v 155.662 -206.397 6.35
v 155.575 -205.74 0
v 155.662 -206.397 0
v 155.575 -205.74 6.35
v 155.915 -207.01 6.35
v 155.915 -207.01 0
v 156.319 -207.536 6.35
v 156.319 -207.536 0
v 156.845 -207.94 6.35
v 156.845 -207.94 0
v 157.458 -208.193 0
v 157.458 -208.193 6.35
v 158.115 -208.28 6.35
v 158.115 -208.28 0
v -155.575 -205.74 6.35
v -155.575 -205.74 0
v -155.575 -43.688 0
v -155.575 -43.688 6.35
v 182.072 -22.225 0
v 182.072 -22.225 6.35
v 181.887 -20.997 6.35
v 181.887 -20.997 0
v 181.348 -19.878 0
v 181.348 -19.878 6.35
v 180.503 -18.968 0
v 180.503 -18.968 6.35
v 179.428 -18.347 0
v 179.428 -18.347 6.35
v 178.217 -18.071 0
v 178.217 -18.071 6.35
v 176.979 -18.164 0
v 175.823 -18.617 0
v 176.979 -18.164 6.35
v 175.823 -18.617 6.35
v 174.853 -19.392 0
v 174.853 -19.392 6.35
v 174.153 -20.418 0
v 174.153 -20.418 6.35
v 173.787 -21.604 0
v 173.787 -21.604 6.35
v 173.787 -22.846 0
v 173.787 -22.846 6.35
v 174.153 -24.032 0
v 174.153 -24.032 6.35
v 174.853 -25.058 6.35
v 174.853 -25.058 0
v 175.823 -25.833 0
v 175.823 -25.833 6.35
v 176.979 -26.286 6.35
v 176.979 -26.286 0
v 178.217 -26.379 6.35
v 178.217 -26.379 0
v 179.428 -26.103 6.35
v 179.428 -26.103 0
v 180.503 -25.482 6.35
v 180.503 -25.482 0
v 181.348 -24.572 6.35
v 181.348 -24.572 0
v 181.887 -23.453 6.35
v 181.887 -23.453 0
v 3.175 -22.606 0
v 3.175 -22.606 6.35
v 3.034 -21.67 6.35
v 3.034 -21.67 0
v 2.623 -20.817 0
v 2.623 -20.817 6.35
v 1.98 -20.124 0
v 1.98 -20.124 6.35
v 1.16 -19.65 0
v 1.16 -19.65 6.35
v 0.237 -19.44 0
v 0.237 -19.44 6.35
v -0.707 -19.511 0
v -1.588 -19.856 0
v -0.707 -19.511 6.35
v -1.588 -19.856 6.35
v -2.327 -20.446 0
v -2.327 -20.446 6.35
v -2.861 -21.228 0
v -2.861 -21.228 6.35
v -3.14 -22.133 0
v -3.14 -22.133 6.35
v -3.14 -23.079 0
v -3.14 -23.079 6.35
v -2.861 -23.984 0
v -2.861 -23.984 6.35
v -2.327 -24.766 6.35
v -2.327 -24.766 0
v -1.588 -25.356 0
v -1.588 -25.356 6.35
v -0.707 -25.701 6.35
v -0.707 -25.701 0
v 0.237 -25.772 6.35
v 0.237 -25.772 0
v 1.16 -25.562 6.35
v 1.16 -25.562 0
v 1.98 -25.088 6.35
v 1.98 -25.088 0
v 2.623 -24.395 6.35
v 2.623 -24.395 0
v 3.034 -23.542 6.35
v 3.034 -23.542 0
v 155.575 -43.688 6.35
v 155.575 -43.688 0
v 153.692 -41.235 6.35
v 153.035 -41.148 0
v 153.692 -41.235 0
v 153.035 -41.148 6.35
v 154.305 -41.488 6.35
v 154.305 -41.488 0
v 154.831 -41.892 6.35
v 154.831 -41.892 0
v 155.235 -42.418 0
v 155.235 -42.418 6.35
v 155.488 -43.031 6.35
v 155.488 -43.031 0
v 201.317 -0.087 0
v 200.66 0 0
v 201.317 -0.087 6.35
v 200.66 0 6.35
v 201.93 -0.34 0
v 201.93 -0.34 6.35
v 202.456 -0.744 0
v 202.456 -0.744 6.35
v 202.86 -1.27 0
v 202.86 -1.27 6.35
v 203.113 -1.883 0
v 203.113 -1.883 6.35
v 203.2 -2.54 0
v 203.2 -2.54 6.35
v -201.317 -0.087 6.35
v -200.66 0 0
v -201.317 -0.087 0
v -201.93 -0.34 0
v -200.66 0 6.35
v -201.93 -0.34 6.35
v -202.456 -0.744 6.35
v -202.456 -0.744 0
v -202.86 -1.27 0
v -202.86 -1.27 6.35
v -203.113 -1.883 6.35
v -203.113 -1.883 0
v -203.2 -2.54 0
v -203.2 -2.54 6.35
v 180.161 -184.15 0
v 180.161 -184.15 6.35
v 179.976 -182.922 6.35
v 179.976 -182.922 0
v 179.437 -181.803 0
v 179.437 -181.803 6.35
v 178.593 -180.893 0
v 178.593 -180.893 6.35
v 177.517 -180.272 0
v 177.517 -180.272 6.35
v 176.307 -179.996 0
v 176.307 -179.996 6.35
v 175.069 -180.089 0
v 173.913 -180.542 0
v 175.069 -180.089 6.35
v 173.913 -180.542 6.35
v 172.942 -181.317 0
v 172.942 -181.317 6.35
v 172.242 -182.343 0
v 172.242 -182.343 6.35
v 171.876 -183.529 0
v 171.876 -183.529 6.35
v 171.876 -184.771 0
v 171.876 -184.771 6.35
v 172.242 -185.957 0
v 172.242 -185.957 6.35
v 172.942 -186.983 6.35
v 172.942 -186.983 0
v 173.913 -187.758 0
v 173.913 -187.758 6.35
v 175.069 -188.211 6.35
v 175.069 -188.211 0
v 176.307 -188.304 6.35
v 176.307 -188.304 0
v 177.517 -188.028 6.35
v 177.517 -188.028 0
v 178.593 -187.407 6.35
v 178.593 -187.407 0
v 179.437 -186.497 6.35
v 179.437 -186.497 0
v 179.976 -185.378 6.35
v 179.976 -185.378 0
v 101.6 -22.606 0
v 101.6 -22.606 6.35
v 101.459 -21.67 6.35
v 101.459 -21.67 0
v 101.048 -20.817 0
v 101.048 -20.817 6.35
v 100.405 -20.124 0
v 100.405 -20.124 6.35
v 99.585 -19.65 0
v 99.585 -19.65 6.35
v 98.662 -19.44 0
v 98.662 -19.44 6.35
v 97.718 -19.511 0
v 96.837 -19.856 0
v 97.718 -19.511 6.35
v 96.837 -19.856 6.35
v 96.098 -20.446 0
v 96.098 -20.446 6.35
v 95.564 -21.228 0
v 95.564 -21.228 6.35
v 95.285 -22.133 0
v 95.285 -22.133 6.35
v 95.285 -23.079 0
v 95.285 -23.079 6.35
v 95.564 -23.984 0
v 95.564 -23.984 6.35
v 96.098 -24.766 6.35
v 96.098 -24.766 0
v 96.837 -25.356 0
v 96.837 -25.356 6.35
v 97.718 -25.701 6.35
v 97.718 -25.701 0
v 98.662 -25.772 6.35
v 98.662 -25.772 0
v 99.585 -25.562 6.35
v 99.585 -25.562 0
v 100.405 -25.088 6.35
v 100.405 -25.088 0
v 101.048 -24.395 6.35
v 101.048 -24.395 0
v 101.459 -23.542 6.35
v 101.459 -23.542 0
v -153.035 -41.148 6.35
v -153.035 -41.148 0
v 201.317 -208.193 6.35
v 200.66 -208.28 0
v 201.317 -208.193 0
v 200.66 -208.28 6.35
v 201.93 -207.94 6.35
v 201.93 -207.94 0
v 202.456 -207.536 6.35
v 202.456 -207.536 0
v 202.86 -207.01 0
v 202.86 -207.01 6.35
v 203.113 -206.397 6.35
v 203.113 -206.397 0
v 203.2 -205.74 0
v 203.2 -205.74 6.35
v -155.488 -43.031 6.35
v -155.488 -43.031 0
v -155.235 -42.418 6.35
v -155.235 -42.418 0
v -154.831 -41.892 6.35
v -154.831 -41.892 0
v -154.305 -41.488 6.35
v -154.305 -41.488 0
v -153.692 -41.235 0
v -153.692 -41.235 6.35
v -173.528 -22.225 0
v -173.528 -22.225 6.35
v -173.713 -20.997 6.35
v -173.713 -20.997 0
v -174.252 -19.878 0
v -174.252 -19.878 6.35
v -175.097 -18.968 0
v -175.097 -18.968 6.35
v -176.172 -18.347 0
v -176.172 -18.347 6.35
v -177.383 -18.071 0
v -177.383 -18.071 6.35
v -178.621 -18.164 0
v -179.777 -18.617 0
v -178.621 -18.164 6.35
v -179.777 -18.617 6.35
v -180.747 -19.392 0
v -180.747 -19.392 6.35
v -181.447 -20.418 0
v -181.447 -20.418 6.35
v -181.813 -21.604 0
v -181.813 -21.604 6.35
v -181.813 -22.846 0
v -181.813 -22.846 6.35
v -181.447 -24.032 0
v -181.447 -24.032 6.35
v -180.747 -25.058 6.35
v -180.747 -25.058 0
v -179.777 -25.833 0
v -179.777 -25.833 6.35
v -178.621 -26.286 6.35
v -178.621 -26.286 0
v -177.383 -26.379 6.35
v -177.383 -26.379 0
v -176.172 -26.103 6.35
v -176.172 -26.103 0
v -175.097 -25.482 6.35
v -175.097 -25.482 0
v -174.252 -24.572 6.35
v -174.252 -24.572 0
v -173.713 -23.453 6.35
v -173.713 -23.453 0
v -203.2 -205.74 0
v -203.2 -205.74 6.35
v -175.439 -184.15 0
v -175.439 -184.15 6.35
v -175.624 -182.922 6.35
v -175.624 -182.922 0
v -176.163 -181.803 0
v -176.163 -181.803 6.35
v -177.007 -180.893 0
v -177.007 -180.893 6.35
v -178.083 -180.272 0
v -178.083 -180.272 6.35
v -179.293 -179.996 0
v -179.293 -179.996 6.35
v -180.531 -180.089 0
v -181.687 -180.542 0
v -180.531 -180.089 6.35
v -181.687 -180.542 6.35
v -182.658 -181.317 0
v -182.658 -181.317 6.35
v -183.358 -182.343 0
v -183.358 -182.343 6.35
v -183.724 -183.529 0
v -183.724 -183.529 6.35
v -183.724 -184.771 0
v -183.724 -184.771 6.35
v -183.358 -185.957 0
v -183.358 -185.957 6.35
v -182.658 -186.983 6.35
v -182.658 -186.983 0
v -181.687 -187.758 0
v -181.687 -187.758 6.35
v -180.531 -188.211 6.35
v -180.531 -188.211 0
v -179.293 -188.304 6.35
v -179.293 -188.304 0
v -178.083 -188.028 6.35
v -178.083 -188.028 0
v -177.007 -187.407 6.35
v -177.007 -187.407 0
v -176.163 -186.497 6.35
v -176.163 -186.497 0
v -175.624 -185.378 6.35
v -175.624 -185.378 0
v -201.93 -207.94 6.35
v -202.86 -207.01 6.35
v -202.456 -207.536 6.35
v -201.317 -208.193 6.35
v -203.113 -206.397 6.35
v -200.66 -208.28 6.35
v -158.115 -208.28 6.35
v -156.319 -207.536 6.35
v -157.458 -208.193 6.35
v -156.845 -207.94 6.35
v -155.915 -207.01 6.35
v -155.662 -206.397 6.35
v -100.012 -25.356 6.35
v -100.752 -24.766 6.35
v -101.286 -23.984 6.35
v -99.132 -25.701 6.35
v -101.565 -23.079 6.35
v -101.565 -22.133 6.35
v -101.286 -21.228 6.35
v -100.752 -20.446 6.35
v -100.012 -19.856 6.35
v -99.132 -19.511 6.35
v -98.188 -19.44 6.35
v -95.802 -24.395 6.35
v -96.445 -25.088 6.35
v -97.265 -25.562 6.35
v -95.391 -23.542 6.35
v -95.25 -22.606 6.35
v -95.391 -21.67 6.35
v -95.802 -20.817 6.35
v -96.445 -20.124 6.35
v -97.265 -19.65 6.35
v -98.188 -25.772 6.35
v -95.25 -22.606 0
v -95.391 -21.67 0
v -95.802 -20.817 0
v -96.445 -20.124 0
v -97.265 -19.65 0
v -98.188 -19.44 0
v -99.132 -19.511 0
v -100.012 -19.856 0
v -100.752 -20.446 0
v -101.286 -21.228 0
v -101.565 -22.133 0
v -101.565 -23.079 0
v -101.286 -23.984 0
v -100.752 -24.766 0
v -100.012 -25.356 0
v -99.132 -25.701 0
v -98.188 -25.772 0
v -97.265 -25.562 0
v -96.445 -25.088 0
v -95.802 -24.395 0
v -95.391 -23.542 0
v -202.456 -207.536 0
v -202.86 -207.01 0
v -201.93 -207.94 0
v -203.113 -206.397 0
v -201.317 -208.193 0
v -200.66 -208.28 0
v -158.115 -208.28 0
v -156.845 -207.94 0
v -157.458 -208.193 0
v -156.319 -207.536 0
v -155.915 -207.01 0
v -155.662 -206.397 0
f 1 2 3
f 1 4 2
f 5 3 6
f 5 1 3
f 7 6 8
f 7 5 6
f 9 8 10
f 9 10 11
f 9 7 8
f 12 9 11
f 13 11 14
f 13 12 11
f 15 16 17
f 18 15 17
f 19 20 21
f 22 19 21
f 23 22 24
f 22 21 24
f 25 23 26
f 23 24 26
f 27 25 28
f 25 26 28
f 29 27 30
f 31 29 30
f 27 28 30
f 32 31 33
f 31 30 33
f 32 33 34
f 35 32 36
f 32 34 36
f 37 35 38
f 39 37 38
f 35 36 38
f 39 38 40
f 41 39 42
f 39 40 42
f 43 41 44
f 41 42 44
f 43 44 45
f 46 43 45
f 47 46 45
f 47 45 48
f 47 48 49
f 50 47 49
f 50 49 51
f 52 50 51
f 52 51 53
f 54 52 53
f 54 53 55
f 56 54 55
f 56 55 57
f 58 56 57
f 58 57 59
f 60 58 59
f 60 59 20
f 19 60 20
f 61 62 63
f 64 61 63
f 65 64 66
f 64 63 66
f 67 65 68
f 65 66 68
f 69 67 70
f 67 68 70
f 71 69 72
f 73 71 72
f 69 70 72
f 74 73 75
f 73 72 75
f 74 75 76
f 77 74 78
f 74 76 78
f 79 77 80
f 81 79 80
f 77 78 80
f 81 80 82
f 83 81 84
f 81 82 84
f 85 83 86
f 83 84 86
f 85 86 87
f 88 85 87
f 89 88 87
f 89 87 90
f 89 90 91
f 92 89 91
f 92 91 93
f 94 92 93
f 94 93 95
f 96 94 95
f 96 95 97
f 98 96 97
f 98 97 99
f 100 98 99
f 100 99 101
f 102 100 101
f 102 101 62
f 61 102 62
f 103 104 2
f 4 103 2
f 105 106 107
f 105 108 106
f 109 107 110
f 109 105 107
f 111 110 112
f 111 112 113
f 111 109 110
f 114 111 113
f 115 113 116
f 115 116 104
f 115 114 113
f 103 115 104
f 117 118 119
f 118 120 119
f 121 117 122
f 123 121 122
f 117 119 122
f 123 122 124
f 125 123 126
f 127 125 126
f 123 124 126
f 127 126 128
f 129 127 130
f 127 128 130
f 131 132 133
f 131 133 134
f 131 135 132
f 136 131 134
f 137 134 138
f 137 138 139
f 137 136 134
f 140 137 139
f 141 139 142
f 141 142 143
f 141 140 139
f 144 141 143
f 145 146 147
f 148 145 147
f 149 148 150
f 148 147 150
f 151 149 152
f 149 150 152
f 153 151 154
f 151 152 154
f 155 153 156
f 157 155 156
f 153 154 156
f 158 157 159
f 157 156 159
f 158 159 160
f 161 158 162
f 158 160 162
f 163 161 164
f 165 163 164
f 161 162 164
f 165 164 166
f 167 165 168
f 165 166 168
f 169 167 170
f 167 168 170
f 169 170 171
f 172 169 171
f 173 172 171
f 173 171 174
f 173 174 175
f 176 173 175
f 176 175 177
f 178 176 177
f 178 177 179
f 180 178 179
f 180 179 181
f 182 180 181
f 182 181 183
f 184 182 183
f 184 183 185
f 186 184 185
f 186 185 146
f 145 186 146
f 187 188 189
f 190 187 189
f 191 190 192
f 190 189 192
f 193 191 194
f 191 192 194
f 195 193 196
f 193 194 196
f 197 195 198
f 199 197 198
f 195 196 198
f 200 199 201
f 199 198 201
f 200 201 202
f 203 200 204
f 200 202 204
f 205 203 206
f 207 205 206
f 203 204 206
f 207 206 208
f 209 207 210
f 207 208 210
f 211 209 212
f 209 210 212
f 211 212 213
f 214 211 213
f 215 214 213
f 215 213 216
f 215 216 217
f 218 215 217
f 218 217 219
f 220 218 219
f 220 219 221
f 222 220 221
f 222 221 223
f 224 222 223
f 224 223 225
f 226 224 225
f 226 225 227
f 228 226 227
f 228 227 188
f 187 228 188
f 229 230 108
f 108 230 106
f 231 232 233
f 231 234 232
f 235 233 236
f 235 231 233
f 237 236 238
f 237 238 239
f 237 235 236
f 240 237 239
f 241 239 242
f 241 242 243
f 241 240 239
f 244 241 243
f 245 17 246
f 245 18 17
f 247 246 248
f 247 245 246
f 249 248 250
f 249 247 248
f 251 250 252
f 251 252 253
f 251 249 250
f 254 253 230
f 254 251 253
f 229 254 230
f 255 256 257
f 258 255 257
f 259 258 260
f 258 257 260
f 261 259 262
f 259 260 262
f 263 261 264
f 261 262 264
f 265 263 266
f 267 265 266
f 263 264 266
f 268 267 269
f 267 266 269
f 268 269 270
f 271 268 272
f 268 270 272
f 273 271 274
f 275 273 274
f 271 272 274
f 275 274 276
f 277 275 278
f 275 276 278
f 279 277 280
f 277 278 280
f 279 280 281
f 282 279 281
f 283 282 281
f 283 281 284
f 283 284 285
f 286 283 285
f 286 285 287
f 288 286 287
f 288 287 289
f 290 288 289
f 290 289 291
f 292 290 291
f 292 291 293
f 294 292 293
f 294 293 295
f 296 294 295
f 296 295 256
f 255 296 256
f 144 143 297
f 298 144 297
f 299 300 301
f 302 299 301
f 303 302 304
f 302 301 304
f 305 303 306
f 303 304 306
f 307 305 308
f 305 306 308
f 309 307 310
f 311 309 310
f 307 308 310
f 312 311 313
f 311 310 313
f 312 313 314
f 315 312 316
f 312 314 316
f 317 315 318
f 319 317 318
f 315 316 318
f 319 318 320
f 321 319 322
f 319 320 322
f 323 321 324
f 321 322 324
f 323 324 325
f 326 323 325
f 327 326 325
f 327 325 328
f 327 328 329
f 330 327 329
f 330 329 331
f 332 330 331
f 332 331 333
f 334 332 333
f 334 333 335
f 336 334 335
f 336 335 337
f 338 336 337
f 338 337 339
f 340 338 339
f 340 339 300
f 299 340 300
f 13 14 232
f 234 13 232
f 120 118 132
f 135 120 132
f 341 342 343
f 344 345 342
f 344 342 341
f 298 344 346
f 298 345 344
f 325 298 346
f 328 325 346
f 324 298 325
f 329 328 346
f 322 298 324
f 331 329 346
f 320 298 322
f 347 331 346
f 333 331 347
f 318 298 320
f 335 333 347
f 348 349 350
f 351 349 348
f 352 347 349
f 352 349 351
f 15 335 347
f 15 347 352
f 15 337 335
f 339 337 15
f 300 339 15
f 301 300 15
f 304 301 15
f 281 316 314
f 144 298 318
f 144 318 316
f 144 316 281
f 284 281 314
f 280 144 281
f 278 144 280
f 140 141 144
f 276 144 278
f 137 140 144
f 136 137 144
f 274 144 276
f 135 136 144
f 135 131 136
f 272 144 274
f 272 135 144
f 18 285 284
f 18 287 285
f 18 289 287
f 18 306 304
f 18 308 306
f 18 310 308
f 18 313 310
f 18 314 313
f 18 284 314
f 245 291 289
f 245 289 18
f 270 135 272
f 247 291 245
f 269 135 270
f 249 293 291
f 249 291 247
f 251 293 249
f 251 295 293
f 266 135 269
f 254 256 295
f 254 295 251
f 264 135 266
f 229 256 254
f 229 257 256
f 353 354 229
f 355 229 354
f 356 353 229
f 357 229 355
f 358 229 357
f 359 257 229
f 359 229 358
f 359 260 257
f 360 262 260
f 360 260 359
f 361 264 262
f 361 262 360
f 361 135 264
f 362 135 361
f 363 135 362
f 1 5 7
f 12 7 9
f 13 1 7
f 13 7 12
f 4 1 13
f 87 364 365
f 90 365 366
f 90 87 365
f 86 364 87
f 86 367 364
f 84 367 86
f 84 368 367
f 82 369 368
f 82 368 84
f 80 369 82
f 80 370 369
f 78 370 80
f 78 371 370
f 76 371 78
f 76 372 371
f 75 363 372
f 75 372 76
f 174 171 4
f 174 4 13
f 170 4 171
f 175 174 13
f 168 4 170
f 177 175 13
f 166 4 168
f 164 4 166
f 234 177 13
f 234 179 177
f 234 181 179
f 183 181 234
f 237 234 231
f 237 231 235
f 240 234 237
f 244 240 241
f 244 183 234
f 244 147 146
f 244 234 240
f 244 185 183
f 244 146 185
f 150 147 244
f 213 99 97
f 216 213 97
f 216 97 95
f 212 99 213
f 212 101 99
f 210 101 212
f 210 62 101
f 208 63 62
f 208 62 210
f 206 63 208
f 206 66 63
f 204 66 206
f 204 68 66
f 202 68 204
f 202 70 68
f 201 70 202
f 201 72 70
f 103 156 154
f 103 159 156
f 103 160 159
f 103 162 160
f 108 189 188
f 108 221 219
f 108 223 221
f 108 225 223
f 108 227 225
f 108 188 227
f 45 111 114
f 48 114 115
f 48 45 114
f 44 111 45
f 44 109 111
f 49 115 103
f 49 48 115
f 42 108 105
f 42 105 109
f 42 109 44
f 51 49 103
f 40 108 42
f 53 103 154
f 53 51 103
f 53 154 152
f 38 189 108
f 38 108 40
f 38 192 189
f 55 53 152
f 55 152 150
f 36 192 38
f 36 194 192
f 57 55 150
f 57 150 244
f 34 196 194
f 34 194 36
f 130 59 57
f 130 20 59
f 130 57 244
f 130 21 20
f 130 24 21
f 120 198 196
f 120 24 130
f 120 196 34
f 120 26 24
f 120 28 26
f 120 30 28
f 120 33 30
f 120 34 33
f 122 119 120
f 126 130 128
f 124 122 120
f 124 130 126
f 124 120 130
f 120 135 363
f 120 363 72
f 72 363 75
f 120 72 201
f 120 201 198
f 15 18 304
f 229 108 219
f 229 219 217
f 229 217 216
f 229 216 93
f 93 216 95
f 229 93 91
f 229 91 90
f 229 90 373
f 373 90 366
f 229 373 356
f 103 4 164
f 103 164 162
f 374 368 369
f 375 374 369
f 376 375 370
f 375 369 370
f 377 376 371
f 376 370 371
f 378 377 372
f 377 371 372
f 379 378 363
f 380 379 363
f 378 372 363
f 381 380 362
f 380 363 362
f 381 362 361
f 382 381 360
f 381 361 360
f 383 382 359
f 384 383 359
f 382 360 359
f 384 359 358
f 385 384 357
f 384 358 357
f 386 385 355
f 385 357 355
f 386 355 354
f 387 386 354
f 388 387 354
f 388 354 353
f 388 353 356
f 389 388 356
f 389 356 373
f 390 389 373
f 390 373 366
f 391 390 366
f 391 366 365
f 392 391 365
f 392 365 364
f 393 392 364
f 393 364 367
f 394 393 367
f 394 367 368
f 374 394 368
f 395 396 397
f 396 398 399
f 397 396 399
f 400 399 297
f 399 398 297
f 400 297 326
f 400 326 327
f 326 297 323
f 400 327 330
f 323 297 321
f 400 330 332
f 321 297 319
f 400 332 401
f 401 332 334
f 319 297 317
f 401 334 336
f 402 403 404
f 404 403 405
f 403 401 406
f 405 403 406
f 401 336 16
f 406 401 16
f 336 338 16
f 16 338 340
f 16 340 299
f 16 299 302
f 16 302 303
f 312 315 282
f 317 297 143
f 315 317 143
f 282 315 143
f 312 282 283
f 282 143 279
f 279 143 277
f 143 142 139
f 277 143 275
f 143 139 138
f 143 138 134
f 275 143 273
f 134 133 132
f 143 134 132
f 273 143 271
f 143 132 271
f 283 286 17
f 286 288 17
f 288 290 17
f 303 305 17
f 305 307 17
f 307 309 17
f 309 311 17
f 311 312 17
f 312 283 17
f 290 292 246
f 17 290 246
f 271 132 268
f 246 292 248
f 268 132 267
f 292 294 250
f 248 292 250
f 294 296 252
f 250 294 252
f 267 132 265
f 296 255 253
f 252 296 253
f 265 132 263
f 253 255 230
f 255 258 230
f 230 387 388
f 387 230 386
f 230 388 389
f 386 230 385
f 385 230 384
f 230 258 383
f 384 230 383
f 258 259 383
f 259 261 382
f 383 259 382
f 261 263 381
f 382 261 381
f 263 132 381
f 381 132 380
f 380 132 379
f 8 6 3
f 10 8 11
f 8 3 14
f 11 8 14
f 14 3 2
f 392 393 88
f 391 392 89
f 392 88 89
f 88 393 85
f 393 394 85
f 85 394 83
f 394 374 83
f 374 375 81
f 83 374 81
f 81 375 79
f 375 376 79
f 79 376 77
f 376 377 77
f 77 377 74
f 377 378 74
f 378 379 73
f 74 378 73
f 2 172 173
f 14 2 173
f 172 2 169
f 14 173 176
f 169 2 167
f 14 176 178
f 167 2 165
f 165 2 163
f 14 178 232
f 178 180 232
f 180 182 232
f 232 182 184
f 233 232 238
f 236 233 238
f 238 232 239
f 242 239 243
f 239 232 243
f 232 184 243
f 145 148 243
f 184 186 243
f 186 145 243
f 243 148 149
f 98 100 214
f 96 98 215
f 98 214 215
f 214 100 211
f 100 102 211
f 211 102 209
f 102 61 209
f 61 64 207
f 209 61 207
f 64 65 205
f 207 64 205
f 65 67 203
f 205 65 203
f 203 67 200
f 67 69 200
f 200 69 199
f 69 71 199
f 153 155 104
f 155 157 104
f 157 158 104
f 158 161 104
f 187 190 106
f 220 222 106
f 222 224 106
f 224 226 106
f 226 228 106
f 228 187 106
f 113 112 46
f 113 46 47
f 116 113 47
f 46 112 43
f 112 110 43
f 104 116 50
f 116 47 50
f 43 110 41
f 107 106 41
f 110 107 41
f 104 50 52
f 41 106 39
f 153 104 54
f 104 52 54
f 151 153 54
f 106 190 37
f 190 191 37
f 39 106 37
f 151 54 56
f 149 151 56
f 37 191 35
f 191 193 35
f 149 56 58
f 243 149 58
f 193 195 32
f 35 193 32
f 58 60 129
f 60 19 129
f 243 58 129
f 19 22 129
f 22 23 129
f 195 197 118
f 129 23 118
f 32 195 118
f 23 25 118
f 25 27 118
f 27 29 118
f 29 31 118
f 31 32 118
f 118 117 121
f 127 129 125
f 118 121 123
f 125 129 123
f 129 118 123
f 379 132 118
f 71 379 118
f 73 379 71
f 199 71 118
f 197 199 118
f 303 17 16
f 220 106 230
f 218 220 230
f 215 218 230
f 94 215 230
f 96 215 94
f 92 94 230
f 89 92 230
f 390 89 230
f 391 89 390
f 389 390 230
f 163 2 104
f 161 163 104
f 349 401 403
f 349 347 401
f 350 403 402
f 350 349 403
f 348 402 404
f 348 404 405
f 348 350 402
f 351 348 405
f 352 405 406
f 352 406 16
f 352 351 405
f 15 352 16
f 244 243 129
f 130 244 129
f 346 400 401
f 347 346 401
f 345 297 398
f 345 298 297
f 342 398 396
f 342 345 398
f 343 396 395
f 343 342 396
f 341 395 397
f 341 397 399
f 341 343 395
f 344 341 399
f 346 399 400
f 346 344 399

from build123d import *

# Parameters (mm, degrees)
F1_DEPTH = 6.35
F2_R     = 2.54
F3_R     = 4.1656
F4_DEPTH = 25.4
F5_R     = 3.175
F6_DEPTH = 25.4


with BuildPart() as f1:
    # F0 (on Top) → F1 (new body)
    with BuildSketch(Plane.XY):
        Polygon((203.2, 0), (-203.2, 0), (-203.2, -208.28), (-155.575, -208.28), (-155.575, -41.148), (155.575, -41.148), (155.575, -208.28), (203.2, -208.28), align=None)
    extrude(amount=F1_DEPTH)

    # F2
    f2_edges = [f1.edges().sort_by_distance(p)[0] for p in [
        (-155.575, -41.148, 3.175),
        (155.575, -41.148, 3.175),
        (155.575, -208.28, 3.175),
        (-155.575, -208.28, 3.175),
        (-203.2, -208.28, 3.175),
        (203.2, -208.28, 3.175),
        (203.2, 0, 3.175),
        (-203.2, 0, 3.175),
    ]]
    fillet(f2_edges, radius=F2_R)

    # F3 (on face) → F4 (cut)
    with BuildSketch(Plane.XY.offset(6.35)):
        with Locations((-177.693859, -22.225)):
            Circle(F3_R)
        with Locations((-179.604545, -184.15)):
            Circle(F3_R)
        with Locations((177.906141, -22.225)):
            Circle(F3_R)
        with Locations((175.995455, -184.15)):
            Circle(F3_R)
    extrude(amount=-F4_DEPTH, mode=Mode.SUBTRACT)

    # F5 (on face) → F6 (cut)
    with BuildSketch(Plane.XY.offset(6.35)):
        with Locations((0, -22.606)):
            Circle(F5_R)
        with Locations((-98.425, -22.606)):
            Circle(F5_R)
        with Locations((98.425, -22.606)):
            Circle(F5_R)
    extrude(amount=-F6_DEPTH, mode=Mode.SUBTRACT)


solid = f1.part
